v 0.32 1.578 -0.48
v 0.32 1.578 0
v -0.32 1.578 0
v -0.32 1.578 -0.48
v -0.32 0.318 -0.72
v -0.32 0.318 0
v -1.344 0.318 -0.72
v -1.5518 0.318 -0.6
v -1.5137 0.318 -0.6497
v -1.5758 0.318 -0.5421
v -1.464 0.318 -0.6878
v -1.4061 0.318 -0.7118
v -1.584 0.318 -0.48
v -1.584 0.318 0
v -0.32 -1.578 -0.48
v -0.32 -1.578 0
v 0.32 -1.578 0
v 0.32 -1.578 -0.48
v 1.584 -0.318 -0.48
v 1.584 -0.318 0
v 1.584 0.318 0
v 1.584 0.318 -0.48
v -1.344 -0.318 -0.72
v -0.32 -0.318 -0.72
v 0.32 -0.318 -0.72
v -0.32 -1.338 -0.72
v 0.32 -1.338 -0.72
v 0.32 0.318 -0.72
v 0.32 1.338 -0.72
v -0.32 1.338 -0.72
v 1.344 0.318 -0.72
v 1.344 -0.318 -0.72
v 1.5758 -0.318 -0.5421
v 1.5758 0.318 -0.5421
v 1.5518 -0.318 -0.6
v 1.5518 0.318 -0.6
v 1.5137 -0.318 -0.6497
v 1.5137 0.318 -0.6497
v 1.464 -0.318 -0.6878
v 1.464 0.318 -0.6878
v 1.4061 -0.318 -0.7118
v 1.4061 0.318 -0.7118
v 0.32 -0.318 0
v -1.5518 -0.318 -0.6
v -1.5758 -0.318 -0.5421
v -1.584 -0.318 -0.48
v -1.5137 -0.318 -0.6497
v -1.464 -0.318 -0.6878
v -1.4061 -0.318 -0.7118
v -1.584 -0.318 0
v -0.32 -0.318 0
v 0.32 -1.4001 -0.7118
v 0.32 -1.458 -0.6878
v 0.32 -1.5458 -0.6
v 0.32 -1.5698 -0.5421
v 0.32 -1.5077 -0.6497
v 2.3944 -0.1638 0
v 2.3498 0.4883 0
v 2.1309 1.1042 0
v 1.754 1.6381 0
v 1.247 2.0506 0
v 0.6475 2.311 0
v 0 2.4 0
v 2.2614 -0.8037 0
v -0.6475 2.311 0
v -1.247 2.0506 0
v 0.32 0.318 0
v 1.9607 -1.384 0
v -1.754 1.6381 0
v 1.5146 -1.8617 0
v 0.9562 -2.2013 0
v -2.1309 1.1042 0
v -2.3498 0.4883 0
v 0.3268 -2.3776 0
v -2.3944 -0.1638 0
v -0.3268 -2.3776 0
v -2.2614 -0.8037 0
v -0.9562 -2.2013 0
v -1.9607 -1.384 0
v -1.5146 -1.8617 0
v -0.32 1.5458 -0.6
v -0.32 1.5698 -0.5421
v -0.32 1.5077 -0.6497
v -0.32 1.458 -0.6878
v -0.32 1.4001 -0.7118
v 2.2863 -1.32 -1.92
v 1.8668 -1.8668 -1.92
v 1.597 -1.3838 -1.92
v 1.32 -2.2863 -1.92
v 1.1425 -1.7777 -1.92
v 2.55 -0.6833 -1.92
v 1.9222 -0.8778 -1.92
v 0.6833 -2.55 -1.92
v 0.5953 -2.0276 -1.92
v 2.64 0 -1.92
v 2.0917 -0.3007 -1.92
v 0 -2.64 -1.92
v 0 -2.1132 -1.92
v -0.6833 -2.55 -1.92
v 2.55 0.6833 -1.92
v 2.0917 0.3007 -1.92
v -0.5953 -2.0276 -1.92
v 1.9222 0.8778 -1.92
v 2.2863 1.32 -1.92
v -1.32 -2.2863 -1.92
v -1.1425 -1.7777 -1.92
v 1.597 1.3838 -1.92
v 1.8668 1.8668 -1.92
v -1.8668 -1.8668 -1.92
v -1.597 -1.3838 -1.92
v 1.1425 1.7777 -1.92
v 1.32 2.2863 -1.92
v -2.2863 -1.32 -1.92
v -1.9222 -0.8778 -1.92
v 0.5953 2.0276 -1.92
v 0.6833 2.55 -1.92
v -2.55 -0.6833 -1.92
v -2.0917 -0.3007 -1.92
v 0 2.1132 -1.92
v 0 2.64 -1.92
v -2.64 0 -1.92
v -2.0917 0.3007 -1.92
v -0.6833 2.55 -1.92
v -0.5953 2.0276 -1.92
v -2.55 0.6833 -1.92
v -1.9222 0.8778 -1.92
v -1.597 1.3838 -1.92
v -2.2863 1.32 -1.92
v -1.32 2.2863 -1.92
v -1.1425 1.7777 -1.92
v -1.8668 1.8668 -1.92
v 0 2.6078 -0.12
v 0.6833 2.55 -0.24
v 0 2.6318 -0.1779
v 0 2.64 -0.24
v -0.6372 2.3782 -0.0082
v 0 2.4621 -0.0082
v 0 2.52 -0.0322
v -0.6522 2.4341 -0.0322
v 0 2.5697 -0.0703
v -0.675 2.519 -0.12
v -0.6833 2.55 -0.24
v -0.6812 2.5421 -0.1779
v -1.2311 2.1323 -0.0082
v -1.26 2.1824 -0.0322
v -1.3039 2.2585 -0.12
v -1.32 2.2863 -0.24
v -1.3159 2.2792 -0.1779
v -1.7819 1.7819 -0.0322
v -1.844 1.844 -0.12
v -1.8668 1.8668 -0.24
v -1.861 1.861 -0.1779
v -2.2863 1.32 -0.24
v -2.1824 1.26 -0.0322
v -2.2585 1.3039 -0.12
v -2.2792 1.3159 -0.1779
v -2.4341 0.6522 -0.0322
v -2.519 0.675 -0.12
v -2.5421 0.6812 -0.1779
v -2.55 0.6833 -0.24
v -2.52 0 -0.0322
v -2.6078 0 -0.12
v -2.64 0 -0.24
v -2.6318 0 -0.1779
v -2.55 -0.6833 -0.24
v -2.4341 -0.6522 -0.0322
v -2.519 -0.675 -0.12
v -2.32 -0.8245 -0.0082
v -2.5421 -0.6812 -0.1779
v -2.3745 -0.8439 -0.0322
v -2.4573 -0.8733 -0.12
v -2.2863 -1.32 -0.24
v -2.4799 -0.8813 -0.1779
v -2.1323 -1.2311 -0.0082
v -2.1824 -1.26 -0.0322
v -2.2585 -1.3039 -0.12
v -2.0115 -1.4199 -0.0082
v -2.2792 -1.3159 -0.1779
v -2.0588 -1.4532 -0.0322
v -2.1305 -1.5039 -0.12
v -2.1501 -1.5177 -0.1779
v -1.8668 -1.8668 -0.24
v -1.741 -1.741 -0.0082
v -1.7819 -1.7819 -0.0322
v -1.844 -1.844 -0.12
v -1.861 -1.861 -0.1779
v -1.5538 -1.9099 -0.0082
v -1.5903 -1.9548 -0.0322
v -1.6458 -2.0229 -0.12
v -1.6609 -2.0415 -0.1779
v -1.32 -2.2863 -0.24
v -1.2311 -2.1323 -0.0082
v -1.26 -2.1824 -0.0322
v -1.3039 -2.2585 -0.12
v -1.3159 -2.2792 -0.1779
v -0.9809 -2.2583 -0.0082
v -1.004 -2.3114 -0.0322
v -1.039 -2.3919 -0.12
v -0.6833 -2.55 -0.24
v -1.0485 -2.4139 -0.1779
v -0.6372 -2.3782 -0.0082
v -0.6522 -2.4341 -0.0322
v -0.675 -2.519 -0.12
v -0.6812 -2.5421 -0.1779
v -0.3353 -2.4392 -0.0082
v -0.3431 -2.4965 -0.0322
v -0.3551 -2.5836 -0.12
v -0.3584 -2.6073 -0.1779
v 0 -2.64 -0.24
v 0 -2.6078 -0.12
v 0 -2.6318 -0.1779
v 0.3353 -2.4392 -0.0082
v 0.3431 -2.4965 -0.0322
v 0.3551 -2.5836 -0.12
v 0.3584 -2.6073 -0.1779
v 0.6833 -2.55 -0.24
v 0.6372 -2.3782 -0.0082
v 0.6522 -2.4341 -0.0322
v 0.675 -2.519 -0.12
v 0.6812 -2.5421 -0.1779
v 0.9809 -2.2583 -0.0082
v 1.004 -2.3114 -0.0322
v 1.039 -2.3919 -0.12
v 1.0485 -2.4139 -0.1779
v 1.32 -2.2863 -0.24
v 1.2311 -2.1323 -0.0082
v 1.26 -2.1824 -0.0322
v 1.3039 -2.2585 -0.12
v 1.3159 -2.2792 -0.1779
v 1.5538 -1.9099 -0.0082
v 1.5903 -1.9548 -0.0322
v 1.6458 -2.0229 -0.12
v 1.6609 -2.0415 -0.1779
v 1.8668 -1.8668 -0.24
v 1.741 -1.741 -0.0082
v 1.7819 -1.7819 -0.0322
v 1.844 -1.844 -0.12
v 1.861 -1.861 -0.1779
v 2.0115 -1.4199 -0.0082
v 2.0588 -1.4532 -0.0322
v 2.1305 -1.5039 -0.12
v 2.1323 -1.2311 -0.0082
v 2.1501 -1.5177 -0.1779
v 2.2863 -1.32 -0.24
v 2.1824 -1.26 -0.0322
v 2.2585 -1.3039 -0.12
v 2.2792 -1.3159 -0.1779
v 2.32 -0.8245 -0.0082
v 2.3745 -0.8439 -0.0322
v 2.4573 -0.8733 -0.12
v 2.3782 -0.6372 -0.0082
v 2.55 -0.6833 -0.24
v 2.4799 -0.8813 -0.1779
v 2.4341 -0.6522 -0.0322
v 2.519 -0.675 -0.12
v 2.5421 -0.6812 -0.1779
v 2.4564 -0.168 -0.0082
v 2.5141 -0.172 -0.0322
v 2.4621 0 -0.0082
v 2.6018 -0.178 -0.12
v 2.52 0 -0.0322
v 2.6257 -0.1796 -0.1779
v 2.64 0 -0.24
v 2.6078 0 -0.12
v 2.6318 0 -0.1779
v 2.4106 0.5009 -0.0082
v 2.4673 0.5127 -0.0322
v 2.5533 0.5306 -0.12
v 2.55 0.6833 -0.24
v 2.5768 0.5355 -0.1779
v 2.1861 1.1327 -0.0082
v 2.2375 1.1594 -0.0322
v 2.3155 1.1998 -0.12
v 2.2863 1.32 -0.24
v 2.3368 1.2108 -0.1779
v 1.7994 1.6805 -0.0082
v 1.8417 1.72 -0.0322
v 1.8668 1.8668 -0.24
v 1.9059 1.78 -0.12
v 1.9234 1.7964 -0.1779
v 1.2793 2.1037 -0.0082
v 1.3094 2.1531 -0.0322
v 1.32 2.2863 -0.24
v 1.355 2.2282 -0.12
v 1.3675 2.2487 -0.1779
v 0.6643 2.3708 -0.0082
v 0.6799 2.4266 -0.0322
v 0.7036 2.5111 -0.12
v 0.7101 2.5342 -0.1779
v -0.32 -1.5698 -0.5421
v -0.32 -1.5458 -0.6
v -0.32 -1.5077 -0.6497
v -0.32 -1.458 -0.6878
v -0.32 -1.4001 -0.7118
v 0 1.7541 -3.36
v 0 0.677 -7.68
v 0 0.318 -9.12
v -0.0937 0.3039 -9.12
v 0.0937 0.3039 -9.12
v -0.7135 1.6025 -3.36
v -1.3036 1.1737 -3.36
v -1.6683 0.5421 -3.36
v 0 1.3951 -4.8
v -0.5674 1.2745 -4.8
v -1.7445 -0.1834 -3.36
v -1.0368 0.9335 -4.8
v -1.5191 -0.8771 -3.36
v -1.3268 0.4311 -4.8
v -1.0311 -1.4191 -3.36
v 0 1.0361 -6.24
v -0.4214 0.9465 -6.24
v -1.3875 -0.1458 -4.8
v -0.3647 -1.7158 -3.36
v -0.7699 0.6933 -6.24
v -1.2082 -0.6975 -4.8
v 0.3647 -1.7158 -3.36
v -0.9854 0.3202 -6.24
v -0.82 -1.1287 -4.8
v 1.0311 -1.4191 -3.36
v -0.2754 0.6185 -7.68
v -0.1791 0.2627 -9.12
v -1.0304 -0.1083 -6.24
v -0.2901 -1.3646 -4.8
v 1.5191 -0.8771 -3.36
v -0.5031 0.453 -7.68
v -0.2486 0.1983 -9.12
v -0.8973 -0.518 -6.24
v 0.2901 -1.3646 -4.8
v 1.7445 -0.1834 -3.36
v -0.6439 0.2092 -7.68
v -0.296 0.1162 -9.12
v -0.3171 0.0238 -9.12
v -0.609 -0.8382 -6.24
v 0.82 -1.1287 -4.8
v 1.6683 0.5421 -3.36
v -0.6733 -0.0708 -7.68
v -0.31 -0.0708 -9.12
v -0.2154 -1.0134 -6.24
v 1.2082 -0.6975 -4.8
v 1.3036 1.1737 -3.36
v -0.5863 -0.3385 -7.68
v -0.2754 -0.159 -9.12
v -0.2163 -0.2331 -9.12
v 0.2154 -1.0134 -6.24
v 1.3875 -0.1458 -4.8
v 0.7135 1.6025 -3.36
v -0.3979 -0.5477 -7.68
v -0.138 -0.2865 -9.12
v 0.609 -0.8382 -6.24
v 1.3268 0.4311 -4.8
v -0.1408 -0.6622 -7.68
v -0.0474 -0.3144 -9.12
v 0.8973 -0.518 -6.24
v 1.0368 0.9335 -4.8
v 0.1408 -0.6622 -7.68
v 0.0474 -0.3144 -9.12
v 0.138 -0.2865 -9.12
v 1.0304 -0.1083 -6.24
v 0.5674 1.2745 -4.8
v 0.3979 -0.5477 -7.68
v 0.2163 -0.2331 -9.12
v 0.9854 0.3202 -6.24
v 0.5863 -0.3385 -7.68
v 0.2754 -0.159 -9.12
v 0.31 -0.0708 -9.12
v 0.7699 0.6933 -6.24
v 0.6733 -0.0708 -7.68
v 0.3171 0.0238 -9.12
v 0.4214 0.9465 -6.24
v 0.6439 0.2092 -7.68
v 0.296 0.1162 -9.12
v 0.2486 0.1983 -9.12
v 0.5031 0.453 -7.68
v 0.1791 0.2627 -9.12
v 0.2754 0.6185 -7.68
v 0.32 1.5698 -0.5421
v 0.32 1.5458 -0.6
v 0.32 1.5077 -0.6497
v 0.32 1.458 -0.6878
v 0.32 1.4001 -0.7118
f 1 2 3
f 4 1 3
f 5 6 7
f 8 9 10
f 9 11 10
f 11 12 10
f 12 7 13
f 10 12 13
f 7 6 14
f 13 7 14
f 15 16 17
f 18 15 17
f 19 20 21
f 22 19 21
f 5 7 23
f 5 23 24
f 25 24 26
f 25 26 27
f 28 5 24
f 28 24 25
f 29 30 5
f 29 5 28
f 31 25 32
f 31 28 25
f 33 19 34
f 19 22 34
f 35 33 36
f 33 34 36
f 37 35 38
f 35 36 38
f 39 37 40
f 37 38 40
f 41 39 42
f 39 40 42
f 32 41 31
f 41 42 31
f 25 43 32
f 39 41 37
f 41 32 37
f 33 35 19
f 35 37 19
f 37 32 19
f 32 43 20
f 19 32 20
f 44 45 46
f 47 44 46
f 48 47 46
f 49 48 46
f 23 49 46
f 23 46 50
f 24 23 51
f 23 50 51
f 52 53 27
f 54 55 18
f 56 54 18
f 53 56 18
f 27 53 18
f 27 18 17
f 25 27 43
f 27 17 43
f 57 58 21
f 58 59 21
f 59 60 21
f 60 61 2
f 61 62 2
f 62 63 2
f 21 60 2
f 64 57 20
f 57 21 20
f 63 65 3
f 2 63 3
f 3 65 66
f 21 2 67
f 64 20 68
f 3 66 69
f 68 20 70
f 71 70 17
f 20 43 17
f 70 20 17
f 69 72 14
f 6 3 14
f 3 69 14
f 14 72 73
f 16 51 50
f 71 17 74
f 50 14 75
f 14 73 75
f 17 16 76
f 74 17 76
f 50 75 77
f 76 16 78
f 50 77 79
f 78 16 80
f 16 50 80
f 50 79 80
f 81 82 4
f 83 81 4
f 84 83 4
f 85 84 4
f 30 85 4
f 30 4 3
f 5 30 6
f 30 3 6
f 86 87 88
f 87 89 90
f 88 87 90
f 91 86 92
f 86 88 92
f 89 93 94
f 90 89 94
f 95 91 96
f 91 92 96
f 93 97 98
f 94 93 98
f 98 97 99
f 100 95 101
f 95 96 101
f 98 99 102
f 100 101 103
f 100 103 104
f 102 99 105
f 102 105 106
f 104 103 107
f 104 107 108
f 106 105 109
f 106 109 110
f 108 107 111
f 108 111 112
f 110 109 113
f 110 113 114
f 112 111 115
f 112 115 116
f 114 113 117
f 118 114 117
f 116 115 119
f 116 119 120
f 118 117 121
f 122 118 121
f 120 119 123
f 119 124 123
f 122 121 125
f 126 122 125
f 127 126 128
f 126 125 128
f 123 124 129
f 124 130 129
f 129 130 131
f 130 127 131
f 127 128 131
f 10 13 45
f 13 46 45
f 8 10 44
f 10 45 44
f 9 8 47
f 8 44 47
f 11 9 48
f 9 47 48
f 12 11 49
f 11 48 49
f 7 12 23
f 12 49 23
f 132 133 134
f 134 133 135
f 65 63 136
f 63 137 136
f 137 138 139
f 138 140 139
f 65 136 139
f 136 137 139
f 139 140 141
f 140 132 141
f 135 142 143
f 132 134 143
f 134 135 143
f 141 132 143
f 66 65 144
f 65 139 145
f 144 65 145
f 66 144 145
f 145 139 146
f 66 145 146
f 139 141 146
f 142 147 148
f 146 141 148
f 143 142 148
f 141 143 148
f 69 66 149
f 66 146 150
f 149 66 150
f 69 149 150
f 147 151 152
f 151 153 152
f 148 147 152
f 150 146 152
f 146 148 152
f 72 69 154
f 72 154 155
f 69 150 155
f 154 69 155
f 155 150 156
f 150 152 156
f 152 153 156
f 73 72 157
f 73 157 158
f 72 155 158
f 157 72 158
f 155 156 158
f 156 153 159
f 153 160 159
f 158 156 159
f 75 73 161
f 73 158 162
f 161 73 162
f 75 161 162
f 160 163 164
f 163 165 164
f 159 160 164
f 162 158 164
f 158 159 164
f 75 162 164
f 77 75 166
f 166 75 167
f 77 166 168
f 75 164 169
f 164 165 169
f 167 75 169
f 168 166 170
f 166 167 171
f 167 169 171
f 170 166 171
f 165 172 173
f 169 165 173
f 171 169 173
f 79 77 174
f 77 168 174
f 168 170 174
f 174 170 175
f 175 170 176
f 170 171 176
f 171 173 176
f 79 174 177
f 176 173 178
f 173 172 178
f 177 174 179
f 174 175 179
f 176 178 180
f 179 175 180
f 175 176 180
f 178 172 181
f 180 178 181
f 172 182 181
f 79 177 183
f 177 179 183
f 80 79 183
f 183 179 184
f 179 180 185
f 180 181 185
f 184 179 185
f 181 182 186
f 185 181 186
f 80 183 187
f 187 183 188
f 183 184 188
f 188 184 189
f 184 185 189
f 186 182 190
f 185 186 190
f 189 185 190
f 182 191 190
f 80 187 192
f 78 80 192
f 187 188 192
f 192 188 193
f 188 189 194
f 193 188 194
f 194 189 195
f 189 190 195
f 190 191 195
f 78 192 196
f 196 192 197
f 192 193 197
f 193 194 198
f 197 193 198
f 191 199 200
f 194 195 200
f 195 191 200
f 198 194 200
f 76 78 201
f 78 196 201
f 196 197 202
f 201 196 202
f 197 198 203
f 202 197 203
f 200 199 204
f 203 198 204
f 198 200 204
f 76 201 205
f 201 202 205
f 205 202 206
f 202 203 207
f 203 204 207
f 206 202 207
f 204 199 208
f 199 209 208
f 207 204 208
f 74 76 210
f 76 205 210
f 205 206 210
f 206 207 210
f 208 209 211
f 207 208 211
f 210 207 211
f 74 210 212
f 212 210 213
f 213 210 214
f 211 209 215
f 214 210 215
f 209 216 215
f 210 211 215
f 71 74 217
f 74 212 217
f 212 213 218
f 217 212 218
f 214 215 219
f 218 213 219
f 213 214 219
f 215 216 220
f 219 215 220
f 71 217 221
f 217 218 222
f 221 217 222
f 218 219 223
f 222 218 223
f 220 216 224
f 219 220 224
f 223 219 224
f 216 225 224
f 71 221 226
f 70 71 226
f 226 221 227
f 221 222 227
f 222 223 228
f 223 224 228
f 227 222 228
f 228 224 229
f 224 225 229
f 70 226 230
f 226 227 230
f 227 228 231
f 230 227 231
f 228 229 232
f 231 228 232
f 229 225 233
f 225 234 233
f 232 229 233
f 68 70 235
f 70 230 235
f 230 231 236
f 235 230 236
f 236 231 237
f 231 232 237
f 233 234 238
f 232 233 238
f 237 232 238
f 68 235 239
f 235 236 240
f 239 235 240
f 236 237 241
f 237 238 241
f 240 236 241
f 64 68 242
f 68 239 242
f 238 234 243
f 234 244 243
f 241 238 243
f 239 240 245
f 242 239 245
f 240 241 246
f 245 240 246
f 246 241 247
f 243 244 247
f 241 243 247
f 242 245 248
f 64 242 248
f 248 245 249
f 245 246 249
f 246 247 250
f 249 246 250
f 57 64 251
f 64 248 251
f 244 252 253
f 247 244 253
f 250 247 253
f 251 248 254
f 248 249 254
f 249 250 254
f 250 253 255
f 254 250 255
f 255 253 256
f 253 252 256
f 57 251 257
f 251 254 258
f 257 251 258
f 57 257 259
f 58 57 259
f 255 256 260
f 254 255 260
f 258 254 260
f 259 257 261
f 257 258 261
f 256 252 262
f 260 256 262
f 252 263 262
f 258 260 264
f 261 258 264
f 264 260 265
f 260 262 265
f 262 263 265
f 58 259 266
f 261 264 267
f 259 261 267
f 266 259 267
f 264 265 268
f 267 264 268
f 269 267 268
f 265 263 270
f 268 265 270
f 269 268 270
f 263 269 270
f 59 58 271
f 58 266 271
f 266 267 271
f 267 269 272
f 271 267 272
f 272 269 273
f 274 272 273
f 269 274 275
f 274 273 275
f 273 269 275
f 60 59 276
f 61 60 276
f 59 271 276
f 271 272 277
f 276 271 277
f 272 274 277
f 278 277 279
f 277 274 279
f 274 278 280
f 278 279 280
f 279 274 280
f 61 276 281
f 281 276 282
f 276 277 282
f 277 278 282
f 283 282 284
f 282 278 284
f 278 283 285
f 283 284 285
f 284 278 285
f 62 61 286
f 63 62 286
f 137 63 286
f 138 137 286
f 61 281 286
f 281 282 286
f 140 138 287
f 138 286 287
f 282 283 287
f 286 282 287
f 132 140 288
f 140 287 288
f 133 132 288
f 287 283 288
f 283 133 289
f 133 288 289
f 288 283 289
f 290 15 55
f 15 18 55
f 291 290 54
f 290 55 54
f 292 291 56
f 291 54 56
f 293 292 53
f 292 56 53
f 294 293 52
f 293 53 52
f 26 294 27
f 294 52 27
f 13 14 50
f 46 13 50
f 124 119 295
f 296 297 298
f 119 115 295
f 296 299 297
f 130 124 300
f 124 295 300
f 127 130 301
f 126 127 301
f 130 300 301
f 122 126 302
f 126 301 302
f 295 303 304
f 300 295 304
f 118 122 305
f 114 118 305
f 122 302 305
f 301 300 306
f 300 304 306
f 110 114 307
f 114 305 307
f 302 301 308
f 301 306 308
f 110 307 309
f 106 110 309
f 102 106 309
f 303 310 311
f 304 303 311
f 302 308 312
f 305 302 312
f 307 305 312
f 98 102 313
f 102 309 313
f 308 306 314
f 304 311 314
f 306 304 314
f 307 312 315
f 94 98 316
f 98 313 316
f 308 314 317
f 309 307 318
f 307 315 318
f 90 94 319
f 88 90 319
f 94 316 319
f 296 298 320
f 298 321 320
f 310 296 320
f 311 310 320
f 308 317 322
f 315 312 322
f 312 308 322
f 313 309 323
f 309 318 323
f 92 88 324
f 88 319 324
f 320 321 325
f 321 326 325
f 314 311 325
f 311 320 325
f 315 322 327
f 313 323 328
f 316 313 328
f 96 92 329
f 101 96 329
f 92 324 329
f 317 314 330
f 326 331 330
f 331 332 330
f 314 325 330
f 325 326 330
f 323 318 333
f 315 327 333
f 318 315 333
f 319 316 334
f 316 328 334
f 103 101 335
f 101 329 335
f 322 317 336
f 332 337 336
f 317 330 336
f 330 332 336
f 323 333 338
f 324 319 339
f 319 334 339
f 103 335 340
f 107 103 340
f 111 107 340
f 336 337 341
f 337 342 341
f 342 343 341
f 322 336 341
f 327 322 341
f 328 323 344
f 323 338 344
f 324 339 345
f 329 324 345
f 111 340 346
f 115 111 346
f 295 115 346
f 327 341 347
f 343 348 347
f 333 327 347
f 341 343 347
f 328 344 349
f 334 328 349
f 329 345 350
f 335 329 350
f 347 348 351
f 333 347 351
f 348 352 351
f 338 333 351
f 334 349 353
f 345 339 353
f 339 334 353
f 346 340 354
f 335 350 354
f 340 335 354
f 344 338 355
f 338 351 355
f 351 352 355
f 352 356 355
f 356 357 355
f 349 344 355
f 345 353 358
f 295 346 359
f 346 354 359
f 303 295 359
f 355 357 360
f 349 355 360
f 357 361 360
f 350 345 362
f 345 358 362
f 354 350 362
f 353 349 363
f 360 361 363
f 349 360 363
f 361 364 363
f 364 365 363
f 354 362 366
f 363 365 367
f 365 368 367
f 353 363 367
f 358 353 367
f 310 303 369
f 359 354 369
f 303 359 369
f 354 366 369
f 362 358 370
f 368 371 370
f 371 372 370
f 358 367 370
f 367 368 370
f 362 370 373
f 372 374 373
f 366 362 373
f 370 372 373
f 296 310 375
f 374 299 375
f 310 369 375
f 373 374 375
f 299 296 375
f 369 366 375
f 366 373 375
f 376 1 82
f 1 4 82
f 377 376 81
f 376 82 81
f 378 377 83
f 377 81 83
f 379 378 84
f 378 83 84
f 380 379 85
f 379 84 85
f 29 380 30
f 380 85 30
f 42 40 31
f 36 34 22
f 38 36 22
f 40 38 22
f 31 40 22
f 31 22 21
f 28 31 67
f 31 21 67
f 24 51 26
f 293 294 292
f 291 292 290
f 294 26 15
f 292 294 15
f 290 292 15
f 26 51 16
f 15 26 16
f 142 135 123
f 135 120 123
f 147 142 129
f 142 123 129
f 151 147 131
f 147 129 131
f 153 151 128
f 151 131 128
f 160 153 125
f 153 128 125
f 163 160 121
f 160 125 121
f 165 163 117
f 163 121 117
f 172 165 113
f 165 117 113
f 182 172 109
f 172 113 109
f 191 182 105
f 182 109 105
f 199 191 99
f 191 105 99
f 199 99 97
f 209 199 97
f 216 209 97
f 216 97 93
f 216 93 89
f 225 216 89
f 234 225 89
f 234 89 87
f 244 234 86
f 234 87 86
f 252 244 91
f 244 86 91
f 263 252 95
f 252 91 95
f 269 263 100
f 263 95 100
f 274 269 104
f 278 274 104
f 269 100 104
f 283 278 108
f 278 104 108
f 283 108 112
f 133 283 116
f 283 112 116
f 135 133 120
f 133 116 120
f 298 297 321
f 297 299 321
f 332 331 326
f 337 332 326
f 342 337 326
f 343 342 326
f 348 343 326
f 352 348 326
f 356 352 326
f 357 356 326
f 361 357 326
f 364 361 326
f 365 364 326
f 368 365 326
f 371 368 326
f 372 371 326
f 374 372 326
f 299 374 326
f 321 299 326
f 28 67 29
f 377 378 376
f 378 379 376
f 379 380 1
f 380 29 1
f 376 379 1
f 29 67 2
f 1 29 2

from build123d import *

# Parameters (mm, degrees)
ENL_V_MAT_EXTRU_2_DEPTH = 0.72
CONG_4_R                = 0.24


with BuildPart() as part:
    # Esquisse1 → Révolution1 (revolve)
    with BuildSketch(Plane(origin=(0, 0, 0), x_dir=(0, 0, -1), z_dir=(1, 0, 0))):
        with BuildLine():
            Line((9.12, 0), (0, 0))
            Line((0, 0), (0, 2.4))
            ThreePointArc((0, 2.4), (0.070294373, 2.569705627), (0.24, 2.64))
            Line((0.24, 2.64), (1.92, 2.64))
            Line((1.92, 2.64), (1.92, 2.11316162))
            Line((1.92, 2.11316162), (9.12, 0.318))
            Line((9.12, 0.318), (9.12, 0))
        make_face()
    revolve(axis=Axis((0, 0, -9.12), (0, 0, 1)))

    # Esquisse3 → Enlèv. mat.-Extru.2 (cut)
    with BuildSketch(Plane.XY):
        Polygon((0.32, 1.578), (-0.32, 1.578), (-0.32, 0.318), (-1.584, 0.318), (-1.584, -0.318), (-0.32, -0.318), (-0.32, -1.578), (0.32, -1.578), (0.32, -0.318), (1.584, -0.318), (1.584, 0.318), (0.32, 0.318), align=None)
    extrude(amount=-ENL_V_MAT_EXTRU_2_DEPTH, mode=Mode.SUBTRACT)

    # Congé4
    cong_4_edges = [part.edges().sort_by_distance(p)[0] for p in [
        (0, -1.578, -0.72),
        (-1.584, 0, -0.72),
        (0, 1.578, -0.72),
        (1.584, 0, -0.72),
    ]]
    fillet(cong_4_edges, radius=CONG_4_R)


solid = part.part
